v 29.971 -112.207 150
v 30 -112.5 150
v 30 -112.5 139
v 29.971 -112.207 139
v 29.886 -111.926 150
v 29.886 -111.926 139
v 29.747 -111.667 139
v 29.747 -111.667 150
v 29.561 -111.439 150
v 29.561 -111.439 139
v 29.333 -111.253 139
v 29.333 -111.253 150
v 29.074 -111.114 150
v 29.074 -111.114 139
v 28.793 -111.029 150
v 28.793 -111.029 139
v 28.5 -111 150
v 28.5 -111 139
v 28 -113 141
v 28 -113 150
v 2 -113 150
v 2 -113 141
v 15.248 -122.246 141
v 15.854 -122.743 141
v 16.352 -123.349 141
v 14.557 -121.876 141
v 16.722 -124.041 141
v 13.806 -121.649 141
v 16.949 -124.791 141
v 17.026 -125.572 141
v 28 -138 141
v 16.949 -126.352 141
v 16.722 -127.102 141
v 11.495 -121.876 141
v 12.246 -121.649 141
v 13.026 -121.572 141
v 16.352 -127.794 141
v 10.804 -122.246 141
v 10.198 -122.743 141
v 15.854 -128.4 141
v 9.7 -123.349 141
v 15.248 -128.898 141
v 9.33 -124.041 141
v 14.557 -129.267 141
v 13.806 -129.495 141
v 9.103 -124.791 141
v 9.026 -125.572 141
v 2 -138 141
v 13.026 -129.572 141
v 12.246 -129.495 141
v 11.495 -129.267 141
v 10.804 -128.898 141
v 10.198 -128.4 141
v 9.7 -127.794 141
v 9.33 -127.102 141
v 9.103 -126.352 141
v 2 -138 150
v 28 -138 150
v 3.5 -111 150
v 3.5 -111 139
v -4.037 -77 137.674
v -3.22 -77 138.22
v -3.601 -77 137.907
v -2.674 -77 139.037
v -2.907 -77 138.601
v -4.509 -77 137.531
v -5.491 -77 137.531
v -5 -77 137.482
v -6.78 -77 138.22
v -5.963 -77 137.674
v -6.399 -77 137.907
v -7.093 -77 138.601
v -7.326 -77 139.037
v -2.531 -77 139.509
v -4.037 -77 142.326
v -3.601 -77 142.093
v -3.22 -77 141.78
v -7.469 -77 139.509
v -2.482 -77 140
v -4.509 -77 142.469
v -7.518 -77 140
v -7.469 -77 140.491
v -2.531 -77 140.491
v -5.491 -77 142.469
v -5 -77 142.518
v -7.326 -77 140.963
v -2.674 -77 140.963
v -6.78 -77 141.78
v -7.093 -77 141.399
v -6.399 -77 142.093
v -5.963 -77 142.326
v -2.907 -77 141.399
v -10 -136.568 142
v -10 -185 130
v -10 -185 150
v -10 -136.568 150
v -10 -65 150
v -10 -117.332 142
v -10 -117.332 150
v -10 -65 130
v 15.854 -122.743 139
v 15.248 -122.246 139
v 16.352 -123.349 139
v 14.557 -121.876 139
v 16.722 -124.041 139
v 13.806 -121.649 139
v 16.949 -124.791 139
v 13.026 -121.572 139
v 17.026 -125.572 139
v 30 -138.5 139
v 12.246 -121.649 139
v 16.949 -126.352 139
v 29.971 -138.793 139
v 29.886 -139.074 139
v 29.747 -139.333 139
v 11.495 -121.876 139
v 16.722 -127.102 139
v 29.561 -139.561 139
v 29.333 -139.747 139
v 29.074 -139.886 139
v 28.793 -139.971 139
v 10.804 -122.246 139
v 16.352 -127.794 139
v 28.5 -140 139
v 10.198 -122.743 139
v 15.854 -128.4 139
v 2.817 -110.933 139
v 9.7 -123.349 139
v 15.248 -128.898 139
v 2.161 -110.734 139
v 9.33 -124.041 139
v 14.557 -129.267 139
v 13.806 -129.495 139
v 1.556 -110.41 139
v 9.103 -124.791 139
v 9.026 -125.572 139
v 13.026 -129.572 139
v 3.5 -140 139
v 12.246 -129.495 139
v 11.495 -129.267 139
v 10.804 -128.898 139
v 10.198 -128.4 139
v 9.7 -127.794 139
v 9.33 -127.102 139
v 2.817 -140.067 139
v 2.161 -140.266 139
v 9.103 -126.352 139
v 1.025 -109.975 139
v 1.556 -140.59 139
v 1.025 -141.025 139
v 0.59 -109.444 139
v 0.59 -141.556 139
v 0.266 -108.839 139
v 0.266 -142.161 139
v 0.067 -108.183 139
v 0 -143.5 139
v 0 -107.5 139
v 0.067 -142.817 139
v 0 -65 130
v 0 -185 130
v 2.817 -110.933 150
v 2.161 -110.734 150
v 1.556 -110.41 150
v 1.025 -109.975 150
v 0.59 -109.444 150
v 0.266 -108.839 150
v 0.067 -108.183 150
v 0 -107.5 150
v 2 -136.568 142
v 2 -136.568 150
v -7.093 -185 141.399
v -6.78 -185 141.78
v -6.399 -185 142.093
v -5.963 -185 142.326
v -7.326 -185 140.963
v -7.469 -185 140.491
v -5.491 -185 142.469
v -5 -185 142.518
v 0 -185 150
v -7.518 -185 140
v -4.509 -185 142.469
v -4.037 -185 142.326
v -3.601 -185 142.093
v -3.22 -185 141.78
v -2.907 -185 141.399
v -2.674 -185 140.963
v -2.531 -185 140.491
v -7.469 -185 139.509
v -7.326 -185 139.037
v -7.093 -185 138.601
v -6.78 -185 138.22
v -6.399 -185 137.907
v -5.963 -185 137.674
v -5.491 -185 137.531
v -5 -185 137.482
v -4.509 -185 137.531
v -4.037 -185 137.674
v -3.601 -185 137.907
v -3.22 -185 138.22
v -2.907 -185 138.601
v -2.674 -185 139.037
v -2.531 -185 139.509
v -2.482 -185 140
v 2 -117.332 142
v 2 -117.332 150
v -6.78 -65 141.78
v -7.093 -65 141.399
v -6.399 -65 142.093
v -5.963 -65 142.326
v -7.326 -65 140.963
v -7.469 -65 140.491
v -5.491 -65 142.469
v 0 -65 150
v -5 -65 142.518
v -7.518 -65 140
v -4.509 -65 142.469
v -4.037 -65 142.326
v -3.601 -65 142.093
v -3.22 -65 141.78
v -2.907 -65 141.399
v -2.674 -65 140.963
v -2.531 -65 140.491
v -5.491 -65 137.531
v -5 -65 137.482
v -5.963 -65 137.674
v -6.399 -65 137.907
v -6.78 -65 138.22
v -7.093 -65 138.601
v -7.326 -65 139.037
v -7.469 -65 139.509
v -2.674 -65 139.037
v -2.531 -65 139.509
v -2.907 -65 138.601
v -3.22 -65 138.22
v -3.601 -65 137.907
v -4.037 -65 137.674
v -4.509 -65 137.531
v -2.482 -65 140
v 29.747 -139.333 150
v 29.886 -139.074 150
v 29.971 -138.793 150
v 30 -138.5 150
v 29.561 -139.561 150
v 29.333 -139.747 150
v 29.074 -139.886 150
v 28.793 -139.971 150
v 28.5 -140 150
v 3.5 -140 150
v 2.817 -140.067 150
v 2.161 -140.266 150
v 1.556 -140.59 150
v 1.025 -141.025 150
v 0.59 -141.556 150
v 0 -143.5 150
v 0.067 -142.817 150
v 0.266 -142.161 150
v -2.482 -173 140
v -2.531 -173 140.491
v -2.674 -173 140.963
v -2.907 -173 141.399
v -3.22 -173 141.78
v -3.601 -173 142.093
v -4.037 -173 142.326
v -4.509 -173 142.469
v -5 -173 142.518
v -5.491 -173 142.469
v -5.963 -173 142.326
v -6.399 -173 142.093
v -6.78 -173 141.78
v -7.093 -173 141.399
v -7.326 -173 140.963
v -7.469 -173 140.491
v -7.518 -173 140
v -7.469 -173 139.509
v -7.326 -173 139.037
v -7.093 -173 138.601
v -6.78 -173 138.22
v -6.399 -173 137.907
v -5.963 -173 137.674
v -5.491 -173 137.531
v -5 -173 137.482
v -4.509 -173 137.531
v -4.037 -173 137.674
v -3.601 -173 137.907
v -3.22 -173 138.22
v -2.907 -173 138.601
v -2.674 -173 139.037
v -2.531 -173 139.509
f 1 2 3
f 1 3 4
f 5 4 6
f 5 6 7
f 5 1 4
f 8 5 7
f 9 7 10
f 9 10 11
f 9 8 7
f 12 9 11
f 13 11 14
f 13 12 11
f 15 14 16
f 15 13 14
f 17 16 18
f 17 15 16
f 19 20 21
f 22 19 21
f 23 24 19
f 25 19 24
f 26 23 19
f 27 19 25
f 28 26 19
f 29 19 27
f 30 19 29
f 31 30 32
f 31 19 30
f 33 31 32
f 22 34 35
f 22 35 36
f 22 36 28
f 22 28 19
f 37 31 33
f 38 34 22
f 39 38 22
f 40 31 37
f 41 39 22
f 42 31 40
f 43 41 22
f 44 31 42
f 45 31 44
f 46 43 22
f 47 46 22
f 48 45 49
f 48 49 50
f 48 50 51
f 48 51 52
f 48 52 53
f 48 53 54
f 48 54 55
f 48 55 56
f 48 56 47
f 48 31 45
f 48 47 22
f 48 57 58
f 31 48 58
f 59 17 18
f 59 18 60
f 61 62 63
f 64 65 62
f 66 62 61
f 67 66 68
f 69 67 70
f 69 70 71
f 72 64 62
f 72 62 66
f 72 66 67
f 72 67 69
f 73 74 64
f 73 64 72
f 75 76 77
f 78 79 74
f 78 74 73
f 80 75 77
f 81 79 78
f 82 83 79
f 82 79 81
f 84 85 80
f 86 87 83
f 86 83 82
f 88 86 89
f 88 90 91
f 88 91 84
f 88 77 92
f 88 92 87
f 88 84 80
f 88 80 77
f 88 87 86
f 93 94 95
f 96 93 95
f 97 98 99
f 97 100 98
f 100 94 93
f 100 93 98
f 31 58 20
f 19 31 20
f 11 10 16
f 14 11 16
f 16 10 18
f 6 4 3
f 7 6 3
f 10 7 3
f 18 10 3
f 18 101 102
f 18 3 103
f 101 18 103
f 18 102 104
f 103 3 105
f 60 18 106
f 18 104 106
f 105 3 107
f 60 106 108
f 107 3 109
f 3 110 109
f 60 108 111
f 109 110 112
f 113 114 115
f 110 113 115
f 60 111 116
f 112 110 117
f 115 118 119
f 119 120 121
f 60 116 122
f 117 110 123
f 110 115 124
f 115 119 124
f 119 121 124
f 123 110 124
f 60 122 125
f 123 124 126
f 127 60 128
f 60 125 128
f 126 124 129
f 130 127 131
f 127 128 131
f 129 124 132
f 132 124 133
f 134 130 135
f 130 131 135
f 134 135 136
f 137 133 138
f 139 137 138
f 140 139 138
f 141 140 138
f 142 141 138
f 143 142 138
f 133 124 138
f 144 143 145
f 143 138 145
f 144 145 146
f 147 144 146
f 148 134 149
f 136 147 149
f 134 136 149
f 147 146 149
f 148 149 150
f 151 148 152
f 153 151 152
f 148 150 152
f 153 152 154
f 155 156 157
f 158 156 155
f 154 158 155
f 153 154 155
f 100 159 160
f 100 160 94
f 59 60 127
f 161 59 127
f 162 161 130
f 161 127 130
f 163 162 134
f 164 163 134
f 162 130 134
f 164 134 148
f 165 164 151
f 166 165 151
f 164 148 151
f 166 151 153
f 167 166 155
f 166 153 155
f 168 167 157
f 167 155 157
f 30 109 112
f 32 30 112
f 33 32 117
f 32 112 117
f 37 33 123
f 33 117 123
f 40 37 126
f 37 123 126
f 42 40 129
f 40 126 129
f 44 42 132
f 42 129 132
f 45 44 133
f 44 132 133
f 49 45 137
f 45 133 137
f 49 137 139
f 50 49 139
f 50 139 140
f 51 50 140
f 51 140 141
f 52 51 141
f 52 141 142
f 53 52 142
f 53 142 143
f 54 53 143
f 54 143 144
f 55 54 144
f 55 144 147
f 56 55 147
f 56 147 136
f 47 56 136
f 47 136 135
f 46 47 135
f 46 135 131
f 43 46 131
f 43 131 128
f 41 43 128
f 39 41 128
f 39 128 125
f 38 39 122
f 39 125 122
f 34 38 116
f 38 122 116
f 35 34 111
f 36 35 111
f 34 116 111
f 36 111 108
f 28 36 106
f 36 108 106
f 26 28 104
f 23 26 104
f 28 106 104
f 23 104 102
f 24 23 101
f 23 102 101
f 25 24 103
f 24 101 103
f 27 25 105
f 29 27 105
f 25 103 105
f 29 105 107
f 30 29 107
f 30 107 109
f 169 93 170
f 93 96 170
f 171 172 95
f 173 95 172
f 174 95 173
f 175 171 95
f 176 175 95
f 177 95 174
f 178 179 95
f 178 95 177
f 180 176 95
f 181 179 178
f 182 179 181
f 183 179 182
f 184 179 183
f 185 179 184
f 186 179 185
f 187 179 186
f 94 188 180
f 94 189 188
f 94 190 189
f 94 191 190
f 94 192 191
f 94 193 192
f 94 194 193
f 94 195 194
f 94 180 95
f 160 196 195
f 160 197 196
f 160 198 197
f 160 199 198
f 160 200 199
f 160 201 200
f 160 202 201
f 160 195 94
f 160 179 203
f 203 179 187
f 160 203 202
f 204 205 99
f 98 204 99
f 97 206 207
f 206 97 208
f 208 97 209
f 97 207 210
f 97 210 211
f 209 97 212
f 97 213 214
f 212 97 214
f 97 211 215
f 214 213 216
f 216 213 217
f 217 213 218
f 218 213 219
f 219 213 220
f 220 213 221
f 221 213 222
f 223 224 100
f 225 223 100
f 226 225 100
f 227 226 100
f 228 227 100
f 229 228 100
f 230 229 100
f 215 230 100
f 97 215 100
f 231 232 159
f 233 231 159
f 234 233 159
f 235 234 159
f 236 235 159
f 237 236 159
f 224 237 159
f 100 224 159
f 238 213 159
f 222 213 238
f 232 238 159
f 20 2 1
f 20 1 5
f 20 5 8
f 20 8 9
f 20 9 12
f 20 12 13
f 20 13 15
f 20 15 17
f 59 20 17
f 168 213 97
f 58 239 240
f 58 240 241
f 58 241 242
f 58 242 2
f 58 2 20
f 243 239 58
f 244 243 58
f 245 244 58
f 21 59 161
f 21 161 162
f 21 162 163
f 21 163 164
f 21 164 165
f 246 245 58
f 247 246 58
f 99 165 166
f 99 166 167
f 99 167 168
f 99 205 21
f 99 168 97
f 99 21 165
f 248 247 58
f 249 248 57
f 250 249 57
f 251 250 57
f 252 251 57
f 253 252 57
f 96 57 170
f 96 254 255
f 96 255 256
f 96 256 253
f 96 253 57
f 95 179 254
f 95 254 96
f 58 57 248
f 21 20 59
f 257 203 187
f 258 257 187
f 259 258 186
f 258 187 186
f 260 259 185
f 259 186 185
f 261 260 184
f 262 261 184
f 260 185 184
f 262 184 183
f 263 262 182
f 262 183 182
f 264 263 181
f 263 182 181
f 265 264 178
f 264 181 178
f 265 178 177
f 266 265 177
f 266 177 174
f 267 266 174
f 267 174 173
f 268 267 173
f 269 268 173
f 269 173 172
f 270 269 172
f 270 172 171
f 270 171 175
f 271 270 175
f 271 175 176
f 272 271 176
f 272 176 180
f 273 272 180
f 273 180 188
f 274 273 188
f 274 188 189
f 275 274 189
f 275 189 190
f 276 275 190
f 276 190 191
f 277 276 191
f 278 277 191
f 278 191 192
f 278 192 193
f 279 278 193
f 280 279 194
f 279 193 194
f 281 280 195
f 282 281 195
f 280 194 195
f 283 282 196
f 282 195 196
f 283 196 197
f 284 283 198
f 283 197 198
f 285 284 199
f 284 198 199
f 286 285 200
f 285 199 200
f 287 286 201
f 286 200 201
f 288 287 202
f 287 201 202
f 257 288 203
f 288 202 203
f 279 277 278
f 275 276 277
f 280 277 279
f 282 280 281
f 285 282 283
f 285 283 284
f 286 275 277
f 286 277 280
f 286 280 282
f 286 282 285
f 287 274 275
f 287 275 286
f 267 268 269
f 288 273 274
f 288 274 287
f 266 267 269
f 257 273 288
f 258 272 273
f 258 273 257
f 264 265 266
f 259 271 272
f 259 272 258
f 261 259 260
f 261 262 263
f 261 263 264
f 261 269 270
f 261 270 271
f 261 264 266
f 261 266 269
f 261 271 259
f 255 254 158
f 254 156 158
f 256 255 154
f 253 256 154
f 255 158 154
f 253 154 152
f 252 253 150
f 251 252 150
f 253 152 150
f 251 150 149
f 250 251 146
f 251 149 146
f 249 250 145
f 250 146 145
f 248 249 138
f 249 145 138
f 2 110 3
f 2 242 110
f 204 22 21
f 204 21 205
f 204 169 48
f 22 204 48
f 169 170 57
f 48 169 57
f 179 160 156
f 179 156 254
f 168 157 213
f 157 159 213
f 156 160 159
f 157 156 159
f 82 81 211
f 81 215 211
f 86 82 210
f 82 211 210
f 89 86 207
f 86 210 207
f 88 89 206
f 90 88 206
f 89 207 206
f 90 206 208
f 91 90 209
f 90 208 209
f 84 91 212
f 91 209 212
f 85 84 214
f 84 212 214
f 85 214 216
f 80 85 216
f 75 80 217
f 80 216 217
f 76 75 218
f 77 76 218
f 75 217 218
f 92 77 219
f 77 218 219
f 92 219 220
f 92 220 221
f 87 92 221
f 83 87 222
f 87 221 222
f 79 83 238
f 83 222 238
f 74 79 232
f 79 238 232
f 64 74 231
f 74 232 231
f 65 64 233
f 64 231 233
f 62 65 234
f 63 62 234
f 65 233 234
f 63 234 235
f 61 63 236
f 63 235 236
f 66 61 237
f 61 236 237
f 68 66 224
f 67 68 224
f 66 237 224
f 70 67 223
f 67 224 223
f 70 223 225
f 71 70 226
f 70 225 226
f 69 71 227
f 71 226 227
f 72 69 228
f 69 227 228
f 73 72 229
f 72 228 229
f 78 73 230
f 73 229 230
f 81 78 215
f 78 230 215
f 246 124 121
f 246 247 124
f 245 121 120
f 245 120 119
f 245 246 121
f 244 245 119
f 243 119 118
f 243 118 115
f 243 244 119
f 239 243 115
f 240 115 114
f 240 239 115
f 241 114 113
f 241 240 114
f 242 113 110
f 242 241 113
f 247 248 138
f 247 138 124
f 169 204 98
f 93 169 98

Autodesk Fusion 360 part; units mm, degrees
sketch "Sketch1" plane through (0, 0, 0) normal (1, 0, 0) x (0, 1, 0)
  line L0 (0, 0) -> (-230, 0)
  line L1 (-230, 0) -> (-230, 150)
  line L2 (-230, 150) -> (0, 150)
  line L3 (0, 150) -> (0, 0)
  line L4 (-230, 0) -> (-220, 0)
  line L5 (-220, 0) -> (-220, 150)
  line L6 (-220, 150) -> (-230, 150)
  line L7 (-230, 150) -> (-230, 0)
  dimension "d1" = 230
  dimension "d2" = 150
  dimension "d3" = 10
  dimension "d4" = 150
extrude "Extrude1" add sketch "Sketch1" against normal blind 10
extrude "Extrude2" add 1 faces at (-6.6667, -230, 50) along direction (0, -1, 0) blind 20
extrude "Extrude3" add 1 faces at (-6.6667, 0, 100) along direction (0, 1, 0) blind 20
sketch "Sketch2" plane through (0, 0, 0) normal (1, 0, 0) x (0, 1, 0)
  line L0 (20, 150) -> (-250, 150)
  line L1 (-250, 150) -> (-250, 0)
  line L2 (-250, 0) -> (20, 0)
  line L3 (20, 0) -> (20, 150)
  line L4 (-250, 0) -> (-240, 0)
  line L5 (-240, 0) -> (-240, 15)
  line L6 (-240, 15) -> (-250, 15)
  line L7 (-250, 15) -> (-250, 0)
  line L8 (0, 0) -> (-10, 0)
  line L9 (-10, 0) -> (-10, 15)
  line L10 (-10, 15) -> (0, 15)
  line L11 (0, 15) -> (0, 0)
  dimension "d11" = 10
  dimension "d12" = 15
  dimension "d13" = 10
  dimension "d14" = 15
  dimension "d46" = 230
extrude "Extrude12" add 1 faces at (-6.6667, -250, 50) along direction (0, -1, 0) blind 20
extrude "Extrude4" cut sketch "Sketch2" against normal blind 140 contours L1 L2 L4 L5 L6 L7 | L2 L8 L9 L10 L11
fillet "Fillet2" radius 20 1 edges at (-5, 20, 150)
sketch "Sketch3" plane through (0, 0, 0) normal (1, 0, 0) x (0, 1, 0)
  arc A0 (20, 130) -> (0, 150) centre (0, 130) ccw
  line L0 (0, 150) -> (-270, 150)
  line L1 (-250, 15) -> (-240, 15)
  line L2 (-240, 15) -> (-240, 0)
  line L3 (-270, 0) -> (-250, 0)
  line L4 (-10, 0) -> (-10, 15)
  line L5 (-10, 15) -> (0, 15)
  line L6 (0, 15) -> (0, 0)
  line L7 (0, 0) -> (20, 0)
  line L8 (20, 0) -> (20, 130)
  line L9 (-200, 0) -> (-30, 0)
  line L10 (-30, 0) -> (-30, 130)
  line L11 (-30, 130) -> (-200, 130)
  line L12 (-200, 130) -> (-200, 0)
  line L13 (-270, 150) -> (-270, 0)
  line L14 (-250, 0) -> (-250, 15)
  line L15 (-240, 0) -> (-10, 0)
extrude "Extrude5" cut sketch "Sketch3" against normal blind 100 contours L9 L10 L11 L12 L15
sketch "Sketch4" plane through (0, 0, 150) normal (0, 0, 1) x (-1, 0, 0)
  line L0 (0, 0) -> (10, 0)
  line L1 (10, 0) -> (10, 270)
  line L2 (0, 270) -> (0, 0)
  line L3 (0, 140) -> (-30, 140)
  line L4 (-30, 140) -> (-30, 111)
  line L5 (-30, 111) -> (0, 111)
  line L6 (0, 111) -> (0, 140)
  line L7 (0, 140) -> (-30, 111)
  line L8 (-30, 140) -> (0, 111)
  line L9 (-2, 138) -> (-28, 138)
  line L10 (-28, 138) -> (-28, 113)
  line L11 (-28, 113) -> (-2, 113)
  line L12 (-2, 113) -> (-2, 138)
  line L13 (-2, 138) -> (-28, 113) construction
  line L14 (-28, 138) -> (-2, 113) construction
  line L15 (10, 270) -> (0, 270)
  point P0 (-15, 125.5)
  dimension "d23" = 30
  dimension "d24" = 29
  dimension "d25" = 26
  dimension "d26" = 25
extrude "Extrude6" add sketch "Sketch4" against normal blind 10 contours L2 L6 L7 L8 L9 L11 L12 | L5 L7 L8 L11 | L3 L7 L8 L9 | L4 L7 L8 L9 L10 L11 | L7 L8 L11 | L7 L8 L9 L11 L12 | L7 L8 L9 | L7 L8 L9 L10 L11
extrude "Extrude7" cut sketch "Sketch4" against normal blind 8 contours L7 L8 L11 | L7 L8 L9 L11 L12 | L7 L8 L9 | L7 L8 L9 L10 L11
extrude "Extrude9" add 1 faces at (20, -120.6667, 140) along direction (0, 0, -1) blind 1
sketch "Sketch5" plane through (0, 0, 139) normal (0, 0, -1) x (1, 0, 0)
  line L0 (0, 140) -> (0, 111)
  line L1 (0, 111) -> (30, 111)
  line L2 (30, 111) -> (30, 140)
  line L3 (30, 140) -> (0, 140)
  circle A0 centre (13.026, 125.5717) radius 4
  line L4 (0, 111) -> (30, 111)
  line L5 (30, 111) -> (30, 140)
  line L6 (30, 140) -> (0, 140)
  line L7 (0, 140) -> (0, 111)
  line L8 (0, 126.0602) -> (5.9, 126.0602)
  line L9 (15.4722, 111) -> (15.4722, 119.2)
  line L10 (30, 125.5) -> (20.7, 125.5)
  line L11 (15, 140) -> (15, 131.8)
  line L12 (5.9, 119.2) -> (20.7, 119.2)
  line L13 (20.7, 119.2) -> (20.7, 131.8)
  line L14 (20.7, 131.8) -> (5.9, 131.8)
  line L15 (5.9, 131.8) -> (5.9, 119.2)
  dimension "d35" = 8
  dimension "d84" = 5.9
  dimension "d85" = 8.2
  dimension "d86" = 9.3
  dimension "d87" = 8.2
extrude "Extrude10" cut sketch "Sketch5" against normal blind 30 contours A0
fillet "Fillet3" radius 1.5 2 edges at (30, -111, 144.5) (30, -140, 144.5)
fillet "Fillet4" radius 3.5 1 edges at (0, -111, 144.5)
fillet "Fillet5" radius 3.5 1 edges at (0, -140, 144.5)
extrude "Extrude8" cut 1 faces at (24.342, -125.5239, 142) along direction (0, 0, -1) blind 1
fillet "Fillet7" radius 20 1 edges at (-5, -270, 150)
extrude "Extrude13" cut 1 faces at (-6.6667, -200, 86.6667) along direction (0, -1, 0) blind 20
fillet "Fillet8" radius 10 2 edges at (-5, -220, 130) (-5, -30, 130)
sketch "Sketch6" plane through (0, 0, 0) normal (1, 0, 0) x (0, 1, 0)
  line L0 (-210, 130) -> (-40, 130)
  arc A0 (-30, 120) -> (-40, 130) centre (-40, 120) ccw
  line L1 (-30, 120) -> (-30, 0)
  line L2 (-30, 0) -> (-10, 0)
  line L3 (-10, 0) -> (-10, 15)
  line L4 (-10, 15) -> (0, 15)
  line L5 (0, 15) -> (0, 0)
  line L6 (0, 0) -> (20, 0)
  line L7 (20, 0) -> (20, 130)
  arc A1 (20, 130) -> (0, 150) centre (0, 130) ccw
  line L8 (0, 150) -> (-107.5, 150)
  line L9 (-107.5, 150) -> (-107.5, 139)
  line L10 (-107.5, 139) -> (-143.5, 139)
  line L11 (-143.5, 139) -> (-143.5, 150)
  line L12 (-143.5, 150) -> (-250, 150)
  arc A2 (-250, 150) -> (-270, 130) centre (-250, 130) ccw
  line L13 (-270, 130) -> (-270, 0)
  line L14 (-270, 0) -> (-250, 0)
  line L15 (-250, 0) -> (-250, 15)
  line L16 (-250, 15) -> (-240, 15)
  line L17 (-240, 15) -> (-240, 0)
  line L18 (-240, 0) -> (-220, 0)
  line L19 (-220, 0) -> (-220, 120)
  arc A3 (-210, 130) -> (-220, 120) centre (-210, 120) ccw
  line L20 (-270, 0) -> (-198, 0)
  line L21 (-198, 0) -> (-198, 167.8427)
  line L22 (-198, 167.8427) -> (-270, 167.8427)
  line L23 (-270, 167.8427) -> (-270, 0)
  line L24 (20, 0) -> (-52, 0)
  line L25 (-52, 0) -> (-52, 156.7227)
  line L26 (-52, 156.7227) -> (20, 156.7227)
  line L27 (20, 156.7227) -> (20, 0)
  dimension "d57" = 72
extrude "Extrude14" cut sketch "Sketch6" against normal blind 180 contours L0 L12 A2 L13 L14 L15 L16 L17 L18 L19 A3 L20 L21 L23 | L0 L19 A3 L20 L21 | L0 A0 L1 L2 L3 L4 L5 L6 L7 A1 L8 L24 L25 L27 | L0 A0 L1 L24 L25 | L12 A2 L21 L22 L23 | A1 L8 L25 L26 L27
sketch "Sketch7" plane through (0, 0, 0) normal (1, 0, 0) x (0, 1, 0)
  line L0 (-198, 150) -> (-198, 130)
  line L1 (-198, 130) -> (-52, 130)
  line L2 (-52, 130) -> (-52, 150)
  line L3 (-52, 150) -> (-107.5, 150)
  line L4 (-107.5, 150) -> (-107.5, 139)
  line L5 (-107.5, 139) -> (-143.5, 139)
  line L6 (-143.5, 139) -> (-143.5, 150)
  line L7 (-143.5, 150) -> (-198, 150)
  line L8 (-198, 150) -> (-250, 150)
  line L9 (-52, 150) -> (0, 150)
  line L10 (-250, 150) -> (-250, 130)
  line L11 (-250, 130) -> (-198, 130)
  line L12 (0, 150) -> (0, 130)
  line L13 (0, 130) -> (-52, 130)
  dimension "d60" = 52
  dimension "d61" = 52
extrude "Extrude15" add sketch "Sketch7" against normal blind 10 contours L0 L8 L10 L11 | L2 L9 L12 L13
sketch "Sketch8" plane through (0, -250, 0) normal (0, -1, 0) x (1, 0, 0)
  line L0 (0, 130) -> (0, 150)
  line L1 (0, 150) -> (-10, 150)
  line L2 (-10, 150) -> (-10, 130)
  line L3 (-10, 130) -> (0, 130)
  circle A0 centre (-5, 140) radius 3.5
  dimension "d64" = 7
extrude "Extrude16" cut sketch "Sketch8" against normal blind 20 contours A0
sketch "Sketch9" plane through (0, 0, 0) normal (0, 1, 0) x (-1, 0, 0)
  line L0 (0, 150) -> (0, 130)
  line L1 (0, 130) -> (10, 130)
  line L2 (10, 130) -> (10, 150)
  line L3 (10, 150) -> (0, 150)
  circle A0 centre (5, 140) radius 3.5
  dimension "d67" = 7
extrude "Extrude17" cut sketch "Sketch9" against normal blind 20 contours A0
thread "Thread1" "ISO Metric profile 7.0 M7x1 6H" major diameter 7.1472 minor diameter 6.0355 pitch 1 angle 60 resizes the face on face at (-1.7748, -13.3333, 138.6405)
thread "Thread2" "ISO Metric profile 7.0 M7x1 6H" major diameter 7.1472 minor diameter 6.0355 pitch 1 angle 60 resizes the face on face at (-8.2889, -236.6667, 138.8029)
extrude "Extrude18" cut 1 faces at (-4.9248, -250, 147.6698) along direction (0, 1, 0) blind 15
extrude "Extrude19" cut 1 faces at (-4.9248, 0, 147.6698) along direction (0, -1, 0) blind 15
extrude "Extrude20" cut 1 faces at (-4.9248, -235, 147.6698) along direction (0, 1, 0) blind 50
extrude "Extrude21" cut 1 faces at (-5.503, -230, 137.9955) along direction (0, 1, 0) blind 59
extrude "Extrude22" cut 1 faces at (-4.9248, -15, 147.6698) along direction (0, -1, 0) blind 50
extrude "Extrude23" cut 1 faces at (-4.497, -20, 137.9955) along direction (0, -1, 0) blind 57
extrude "Extrude24" add 1 faces at (-5.503, -171, 137.9955) along direction (0, -1, 0) blind 2
thread "Thread3" "ISO Metric profile 6.0 M6x1 6H" major diameter 6.147 minor diameter 5.035 pitch 1 angle 60 resizes the face on face at (-7.3117, -177, 138.0602)
thread "Thread4" "ISO Metric profile 6.0 M6x1 6H" major diameter 6.147 minor diameter 5.035 pitch 1 angle 60 resizes the face on face at (-2.5945, -73, 141.8221)
sketch "Sketch10" plane through (0, 0, 150) normal (0, 0, 1) x (-1, 0, 0)
  line L0 (-28, 138) -> (-2, 138)
  line L1 (-2, 138) -> (-2, 113)
  line L2 (-2, 113) -> (-28, 113)
  line L3 (-28, 113) -> (-28, 138)
  line L4 (0, 65) -> (10, 65)
  line L5 (10, 65) -> (10, 185)
  line L6 (10, 185) -> (0, 185)
  line L7 (0, 185) -> (0, 143.5)
  arc A0 (-3.5, 140) -> (0, 143.5) centre (-3.5, 143.5) ccw
  line L8 (-3.5, 140) -> (-28.5, 140)
  arc A1 (-28.5, 140) -> (-30, 138.5) centre (-28.5, 138.5) ccw
  line L9 (-30, 138.5) -> (-30, 112.5)
  arc A2 (-30, 112.5) -> (-28.5, 111) centre (-28.5, 112.5) ccw
  line L10 (-28.5, 111) -> (-3.5, 111)
  arc A3 (0, 107.5) -> (-3.5, 111) centre (-3.5, 107.5) ccw
  line L11 (0, 107.5) -> (0, 65)
  line L12 (-2, 117.3316) -> (10, 117.3316)
  line L13 (10, 117.3316) -> (10, 136.568)
  line L14 (10, 136.568) -> (-2, 136.568)
  line L15 (-2, 136.568) -> (-2, 117.3316)
extrude "Extrude25" cut sketch "Sketch10" against normal blind 8 contours L1 L5 L12 L13 L14 L15
